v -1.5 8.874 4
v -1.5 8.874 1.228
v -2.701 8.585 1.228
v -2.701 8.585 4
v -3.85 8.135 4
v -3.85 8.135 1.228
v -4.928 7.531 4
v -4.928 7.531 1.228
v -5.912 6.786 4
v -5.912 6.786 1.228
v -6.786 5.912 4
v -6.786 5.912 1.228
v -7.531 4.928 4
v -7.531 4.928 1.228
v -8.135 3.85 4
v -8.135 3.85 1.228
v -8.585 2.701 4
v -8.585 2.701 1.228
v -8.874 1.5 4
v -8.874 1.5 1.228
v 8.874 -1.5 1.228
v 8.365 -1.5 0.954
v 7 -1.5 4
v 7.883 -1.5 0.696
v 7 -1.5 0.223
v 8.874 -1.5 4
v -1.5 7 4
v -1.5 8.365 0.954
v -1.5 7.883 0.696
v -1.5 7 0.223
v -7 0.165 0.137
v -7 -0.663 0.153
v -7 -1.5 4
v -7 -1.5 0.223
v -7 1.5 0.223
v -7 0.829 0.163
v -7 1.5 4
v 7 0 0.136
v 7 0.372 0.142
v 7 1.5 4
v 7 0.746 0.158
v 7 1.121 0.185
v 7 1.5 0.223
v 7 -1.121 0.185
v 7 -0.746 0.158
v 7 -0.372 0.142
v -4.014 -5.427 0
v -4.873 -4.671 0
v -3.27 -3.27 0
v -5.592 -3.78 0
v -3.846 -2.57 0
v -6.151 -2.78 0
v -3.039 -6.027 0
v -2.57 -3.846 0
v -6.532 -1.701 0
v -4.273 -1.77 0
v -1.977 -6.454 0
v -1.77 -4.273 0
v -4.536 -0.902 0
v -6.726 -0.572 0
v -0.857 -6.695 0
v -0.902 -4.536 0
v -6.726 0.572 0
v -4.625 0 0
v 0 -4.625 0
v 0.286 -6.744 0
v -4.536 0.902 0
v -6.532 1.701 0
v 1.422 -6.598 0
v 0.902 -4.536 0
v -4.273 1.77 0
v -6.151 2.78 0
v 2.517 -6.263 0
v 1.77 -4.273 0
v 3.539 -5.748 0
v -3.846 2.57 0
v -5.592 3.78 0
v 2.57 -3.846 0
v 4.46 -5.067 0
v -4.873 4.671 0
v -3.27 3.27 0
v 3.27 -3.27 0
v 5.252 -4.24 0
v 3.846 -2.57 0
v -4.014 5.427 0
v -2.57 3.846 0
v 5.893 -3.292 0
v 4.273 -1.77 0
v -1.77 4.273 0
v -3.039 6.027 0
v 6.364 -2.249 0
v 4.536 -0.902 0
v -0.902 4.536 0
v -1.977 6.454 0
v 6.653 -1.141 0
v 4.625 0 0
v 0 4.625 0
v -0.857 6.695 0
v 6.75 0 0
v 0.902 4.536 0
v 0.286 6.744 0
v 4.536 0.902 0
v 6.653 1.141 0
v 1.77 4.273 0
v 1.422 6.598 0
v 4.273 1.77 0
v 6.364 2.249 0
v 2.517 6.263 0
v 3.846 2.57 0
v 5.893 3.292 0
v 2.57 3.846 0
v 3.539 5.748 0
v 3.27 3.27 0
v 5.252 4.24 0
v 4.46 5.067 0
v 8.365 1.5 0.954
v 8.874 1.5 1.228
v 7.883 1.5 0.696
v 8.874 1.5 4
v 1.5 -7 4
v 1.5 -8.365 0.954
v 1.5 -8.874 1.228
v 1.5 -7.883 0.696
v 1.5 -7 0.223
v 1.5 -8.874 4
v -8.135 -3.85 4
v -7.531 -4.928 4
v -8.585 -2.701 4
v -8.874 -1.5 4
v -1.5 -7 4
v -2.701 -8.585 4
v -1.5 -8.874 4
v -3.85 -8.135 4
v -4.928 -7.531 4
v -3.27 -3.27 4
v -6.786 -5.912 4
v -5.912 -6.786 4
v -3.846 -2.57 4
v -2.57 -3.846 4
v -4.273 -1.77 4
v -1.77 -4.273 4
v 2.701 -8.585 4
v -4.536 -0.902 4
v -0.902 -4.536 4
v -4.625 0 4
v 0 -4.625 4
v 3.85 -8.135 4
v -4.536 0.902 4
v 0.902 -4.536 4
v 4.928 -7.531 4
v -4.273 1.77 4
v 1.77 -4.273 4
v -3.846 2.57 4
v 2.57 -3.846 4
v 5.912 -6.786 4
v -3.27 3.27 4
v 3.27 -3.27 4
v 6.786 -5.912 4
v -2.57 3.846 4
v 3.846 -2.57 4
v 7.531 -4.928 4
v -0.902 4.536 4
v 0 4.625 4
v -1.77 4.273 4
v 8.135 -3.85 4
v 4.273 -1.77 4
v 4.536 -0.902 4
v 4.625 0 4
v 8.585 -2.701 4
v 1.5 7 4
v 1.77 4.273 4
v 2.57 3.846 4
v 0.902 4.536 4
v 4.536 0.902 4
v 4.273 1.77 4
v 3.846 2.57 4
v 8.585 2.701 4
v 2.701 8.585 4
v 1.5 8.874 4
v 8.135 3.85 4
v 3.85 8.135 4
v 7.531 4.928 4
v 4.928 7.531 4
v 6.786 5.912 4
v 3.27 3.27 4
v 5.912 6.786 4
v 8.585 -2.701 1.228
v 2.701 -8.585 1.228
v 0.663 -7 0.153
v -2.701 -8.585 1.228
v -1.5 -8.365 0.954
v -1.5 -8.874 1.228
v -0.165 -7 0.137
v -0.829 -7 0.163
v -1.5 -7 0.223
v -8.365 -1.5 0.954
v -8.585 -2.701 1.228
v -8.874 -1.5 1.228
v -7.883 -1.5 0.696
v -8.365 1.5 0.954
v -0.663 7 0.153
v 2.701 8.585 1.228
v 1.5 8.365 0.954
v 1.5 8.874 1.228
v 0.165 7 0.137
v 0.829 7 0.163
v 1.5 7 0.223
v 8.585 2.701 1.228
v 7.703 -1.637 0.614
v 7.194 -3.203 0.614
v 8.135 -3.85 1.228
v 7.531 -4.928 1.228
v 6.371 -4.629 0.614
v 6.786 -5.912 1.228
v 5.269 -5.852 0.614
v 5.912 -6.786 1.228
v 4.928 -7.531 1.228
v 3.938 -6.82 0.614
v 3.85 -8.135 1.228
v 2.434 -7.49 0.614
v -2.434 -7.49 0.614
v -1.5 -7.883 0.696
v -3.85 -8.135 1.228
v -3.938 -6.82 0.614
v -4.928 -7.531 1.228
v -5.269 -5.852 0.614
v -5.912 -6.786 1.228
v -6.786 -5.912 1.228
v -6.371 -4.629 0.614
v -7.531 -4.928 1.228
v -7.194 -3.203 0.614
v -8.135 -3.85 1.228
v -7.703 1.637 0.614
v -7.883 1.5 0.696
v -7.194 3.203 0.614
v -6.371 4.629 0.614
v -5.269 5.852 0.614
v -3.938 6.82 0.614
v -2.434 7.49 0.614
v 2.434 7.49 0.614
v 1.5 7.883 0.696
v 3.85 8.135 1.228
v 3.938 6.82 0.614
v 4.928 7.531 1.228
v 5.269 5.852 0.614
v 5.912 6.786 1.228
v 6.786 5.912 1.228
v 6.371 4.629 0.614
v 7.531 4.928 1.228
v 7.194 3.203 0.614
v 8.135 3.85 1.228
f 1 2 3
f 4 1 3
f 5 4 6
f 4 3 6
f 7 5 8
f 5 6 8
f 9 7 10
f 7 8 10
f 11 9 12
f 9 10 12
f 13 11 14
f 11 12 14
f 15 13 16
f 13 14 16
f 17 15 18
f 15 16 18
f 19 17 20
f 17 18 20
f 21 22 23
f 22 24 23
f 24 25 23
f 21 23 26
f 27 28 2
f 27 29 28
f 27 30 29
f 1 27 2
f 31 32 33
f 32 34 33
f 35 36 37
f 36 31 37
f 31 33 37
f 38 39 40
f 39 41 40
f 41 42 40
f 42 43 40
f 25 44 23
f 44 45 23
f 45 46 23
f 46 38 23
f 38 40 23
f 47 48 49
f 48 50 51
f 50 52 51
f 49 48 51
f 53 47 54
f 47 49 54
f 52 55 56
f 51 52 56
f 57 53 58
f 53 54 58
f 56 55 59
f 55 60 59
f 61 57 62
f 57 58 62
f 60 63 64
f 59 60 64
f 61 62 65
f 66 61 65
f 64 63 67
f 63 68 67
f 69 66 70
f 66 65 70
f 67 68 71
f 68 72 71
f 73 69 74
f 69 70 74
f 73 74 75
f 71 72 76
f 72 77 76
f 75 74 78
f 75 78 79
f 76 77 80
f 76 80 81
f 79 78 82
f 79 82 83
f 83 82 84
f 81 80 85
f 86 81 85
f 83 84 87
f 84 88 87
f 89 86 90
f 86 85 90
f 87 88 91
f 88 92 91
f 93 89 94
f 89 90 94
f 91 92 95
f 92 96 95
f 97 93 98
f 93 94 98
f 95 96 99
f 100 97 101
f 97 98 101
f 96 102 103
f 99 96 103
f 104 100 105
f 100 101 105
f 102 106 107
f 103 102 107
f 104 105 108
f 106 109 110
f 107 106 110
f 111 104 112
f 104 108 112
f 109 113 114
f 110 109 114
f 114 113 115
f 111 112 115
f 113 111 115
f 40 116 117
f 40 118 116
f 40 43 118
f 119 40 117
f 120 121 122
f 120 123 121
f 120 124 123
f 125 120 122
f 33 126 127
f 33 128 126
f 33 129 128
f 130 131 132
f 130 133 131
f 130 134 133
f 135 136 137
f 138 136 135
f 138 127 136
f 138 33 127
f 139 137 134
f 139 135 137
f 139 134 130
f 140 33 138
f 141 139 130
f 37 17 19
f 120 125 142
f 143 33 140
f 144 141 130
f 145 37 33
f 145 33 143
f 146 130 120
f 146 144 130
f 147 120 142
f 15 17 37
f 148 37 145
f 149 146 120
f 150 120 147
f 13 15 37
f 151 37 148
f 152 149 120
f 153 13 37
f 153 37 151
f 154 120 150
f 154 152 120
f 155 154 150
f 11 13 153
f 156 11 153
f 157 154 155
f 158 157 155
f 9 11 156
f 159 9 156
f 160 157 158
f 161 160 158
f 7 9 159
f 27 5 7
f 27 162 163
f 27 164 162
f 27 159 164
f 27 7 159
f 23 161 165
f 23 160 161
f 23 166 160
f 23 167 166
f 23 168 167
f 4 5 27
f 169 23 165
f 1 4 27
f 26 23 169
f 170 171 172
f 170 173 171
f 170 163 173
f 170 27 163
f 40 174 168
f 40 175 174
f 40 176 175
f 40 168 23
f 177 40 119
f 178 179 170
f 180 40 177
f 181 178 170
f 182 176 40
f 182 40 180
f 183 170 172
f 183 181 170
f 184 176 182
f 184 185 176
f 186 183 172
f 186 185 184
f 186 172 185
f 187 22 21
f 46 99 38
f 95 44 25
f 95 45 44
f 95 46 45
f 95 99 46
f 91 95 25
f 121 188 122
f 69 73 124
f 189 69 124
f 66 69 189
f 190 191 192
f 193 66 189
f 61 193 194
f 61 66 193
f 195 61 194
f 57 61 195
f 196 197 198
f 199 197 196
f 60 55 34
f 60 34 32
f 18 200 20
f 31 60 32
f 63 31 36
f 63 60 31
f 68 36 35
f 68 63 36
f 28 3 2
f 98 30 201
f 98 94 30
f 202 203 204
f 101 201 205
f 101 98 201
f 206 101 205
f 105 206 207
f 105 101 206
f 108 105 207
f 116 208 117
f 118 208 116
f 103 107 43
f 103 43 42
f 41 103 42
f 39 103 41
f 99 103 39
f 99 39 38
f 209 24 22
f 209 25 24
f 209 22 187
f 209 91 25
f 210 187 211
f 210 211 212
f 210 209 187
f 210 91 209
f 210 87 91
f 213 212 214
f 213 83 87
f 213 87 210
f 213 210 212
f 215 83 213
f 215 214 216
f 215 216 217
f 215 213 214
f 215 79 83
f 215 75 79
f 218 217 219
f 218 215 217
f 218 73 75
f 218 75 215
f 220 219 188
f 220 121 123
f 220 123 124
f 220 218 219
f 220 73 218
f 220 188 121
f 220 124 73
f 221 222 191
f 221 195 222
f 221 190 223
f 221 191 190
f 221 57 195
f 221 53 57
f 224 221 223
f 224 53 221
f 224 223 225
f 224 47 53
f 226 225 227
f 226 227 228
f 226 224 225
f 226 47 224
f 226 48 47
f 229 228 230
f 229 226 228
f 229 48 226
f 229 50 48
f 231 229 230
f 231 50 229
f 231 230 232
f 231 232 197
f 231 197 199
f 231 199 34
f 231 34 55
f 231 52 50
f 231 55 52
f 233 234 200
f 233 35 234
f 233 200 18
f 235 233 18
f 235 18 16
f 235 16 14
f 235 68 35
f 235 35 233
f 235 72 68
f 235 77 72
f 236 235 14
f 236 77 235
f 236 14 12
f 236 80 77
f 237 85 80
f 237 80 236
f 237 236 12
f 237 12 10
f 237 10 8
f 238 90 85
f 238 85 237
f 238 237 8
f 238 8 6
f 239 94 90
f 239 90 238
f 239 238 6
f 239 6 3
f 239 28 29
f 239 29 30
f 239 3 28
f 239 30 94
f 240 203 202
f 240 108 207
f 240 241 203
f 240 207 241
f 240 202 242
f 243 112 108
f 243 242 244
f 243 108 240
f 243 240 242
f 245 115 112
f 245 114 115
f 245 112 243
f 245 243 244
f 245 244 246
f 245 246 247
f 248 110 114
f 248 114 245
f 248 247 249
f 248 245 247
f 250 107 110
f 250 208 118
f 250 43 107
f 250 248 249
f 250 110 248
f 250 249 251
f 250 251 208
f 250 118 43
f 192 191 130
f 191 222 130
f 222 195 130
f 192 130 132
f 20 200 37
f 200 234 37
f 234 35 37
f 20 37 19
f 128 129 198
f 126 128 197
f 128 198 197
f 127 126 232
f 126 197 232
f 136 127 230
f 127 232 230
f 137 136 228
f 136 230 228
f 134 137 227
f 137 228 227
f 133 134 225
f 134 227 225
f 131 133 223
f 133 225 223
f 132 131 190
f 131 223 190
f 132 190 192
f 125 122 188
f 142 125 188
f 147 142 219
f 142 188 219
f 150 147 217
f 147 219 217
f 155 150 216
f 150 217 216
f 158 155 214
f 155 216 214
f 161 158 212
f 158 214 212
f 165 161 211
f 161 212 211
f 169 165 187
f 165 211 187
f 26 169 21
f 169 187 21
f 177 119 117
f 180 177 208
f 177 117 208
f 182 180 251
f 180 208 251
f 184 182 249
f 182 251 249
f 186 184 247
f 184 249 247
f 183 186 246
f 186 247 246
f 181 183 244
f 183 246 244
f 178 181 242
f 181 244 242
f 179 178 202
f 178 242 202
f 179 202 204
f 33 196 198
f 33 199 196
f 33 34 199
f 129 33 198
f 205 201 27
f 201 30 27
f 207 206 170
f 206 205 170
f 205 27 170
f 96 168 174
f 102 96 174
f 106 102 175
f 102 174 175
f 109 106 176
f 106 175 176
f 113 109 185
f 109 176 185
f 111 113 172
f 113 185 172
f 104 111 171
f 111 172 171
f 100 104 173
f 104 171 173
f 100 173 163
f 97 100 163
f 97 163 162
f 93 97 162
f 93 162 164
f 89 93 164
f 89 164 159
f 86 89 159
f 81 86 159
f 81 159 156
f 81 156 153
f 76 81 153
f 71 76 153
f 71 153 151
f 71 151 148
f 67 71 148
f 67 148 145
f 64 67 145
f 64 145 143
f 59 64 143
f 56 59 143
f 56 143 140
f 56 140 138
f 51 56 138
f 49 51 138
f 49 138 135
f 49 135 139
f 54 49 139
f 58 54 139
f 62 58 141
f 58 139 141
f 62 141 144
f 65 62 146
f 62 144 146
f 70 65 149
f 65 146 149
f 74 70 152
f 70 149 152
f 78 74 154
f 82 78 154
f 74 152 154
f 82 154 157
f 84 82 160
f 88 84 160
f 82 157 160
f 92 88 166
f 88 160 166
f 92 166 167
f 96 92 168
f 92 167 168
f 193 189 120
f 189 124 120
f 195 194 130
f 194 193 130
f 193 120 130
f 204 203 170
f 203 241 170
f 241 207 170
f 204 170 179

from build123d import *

# Parameters (mm, degrees)
SKETCH1_R              = 9
BOSS_EXTRUDE1_DEPTH    = 4
SKETCH3_W              = 3
SKETCH3_H              = 2
CUT_EXTRUDE1_DEPTH     = 14.341664064
CIRPATTERN1_COUNT      = 4
M10X1_0_TAPPED_HOLE1_D = 9
SKETCH4_R              = 4.625
CUT_EXTRUDE2_DEPTH     = 14.171939872


with BuildPart() as part:
    # Sketch1 → Boss-Extrude1 (new body)
    with BuildSketch(Plane.XY):
        Circle(SKETCH1_R)
    extrude(amount=BOSS_EXTRUDE1_DEPTH)

    # Sketch3 → Cut-Extrude1 (cut, through all)
    with BuildSketch(Plane.XY.offset(4)):
        with Locations((0, 8)):
            Rectangle(SKETCH3_W, SKETCH3_H)
    cut_extrude1 = extrude(amount=-CUT_EXTRUDE1_DEPTH, mode=Mode.SUBTRACT)

    # CirPattern1: Cut-Extrude1 ×4 about axis
    cirpattern1_axis = Axis((0, 0, 0), (0, 0, 1))
    for i in range(1, CIRPATTERN1_COUNT):
        add(cut_extrude1.rotate(cirpattern1_axis, i * 360 / CIRPATTERN1_COUNT), mode=Mode.SUBTRACT)

    # Sketch2 → Cut-Revolve1 (revolve, cut)
    with BuildSketch(Plane(origin=(0, 0, 0), x_dir=(0, 0, -1), z_dir=(1, 0, 0)), mode=Mode.PRIVATE) as cut_revolve1_sk:
        Polygon((-1.227731474, 9), (0, 6.75), (0, 9), align=None)
    revolve(cut_revolve1_sk.sketch.rotate(Axis((0, 0, 4.2), (0, 0, -1)), 90), axis=Axis((0, 0, 4.2), (0, 0, -1)), mode=Mode.SUBTRACT)

    # M10x1.0 Tapped Hole1 (through all)
    with Locations(Plane.XY.offset(4)):
        with Locations((0, 0)):
            Hole(M10X1_0_TAPPED_HOLE1_D / 2)

    # Sketch4 → Cut-Extrude2 (cut, through all)
    with BuildSketch(Plane.XY.offset(4)):
        Circle(SKETCH4_R)
    extrude(amount=-CUT_EXTRUDE2_DEPTH, mode=Mode.SUBTRACT)


solid = part.part
